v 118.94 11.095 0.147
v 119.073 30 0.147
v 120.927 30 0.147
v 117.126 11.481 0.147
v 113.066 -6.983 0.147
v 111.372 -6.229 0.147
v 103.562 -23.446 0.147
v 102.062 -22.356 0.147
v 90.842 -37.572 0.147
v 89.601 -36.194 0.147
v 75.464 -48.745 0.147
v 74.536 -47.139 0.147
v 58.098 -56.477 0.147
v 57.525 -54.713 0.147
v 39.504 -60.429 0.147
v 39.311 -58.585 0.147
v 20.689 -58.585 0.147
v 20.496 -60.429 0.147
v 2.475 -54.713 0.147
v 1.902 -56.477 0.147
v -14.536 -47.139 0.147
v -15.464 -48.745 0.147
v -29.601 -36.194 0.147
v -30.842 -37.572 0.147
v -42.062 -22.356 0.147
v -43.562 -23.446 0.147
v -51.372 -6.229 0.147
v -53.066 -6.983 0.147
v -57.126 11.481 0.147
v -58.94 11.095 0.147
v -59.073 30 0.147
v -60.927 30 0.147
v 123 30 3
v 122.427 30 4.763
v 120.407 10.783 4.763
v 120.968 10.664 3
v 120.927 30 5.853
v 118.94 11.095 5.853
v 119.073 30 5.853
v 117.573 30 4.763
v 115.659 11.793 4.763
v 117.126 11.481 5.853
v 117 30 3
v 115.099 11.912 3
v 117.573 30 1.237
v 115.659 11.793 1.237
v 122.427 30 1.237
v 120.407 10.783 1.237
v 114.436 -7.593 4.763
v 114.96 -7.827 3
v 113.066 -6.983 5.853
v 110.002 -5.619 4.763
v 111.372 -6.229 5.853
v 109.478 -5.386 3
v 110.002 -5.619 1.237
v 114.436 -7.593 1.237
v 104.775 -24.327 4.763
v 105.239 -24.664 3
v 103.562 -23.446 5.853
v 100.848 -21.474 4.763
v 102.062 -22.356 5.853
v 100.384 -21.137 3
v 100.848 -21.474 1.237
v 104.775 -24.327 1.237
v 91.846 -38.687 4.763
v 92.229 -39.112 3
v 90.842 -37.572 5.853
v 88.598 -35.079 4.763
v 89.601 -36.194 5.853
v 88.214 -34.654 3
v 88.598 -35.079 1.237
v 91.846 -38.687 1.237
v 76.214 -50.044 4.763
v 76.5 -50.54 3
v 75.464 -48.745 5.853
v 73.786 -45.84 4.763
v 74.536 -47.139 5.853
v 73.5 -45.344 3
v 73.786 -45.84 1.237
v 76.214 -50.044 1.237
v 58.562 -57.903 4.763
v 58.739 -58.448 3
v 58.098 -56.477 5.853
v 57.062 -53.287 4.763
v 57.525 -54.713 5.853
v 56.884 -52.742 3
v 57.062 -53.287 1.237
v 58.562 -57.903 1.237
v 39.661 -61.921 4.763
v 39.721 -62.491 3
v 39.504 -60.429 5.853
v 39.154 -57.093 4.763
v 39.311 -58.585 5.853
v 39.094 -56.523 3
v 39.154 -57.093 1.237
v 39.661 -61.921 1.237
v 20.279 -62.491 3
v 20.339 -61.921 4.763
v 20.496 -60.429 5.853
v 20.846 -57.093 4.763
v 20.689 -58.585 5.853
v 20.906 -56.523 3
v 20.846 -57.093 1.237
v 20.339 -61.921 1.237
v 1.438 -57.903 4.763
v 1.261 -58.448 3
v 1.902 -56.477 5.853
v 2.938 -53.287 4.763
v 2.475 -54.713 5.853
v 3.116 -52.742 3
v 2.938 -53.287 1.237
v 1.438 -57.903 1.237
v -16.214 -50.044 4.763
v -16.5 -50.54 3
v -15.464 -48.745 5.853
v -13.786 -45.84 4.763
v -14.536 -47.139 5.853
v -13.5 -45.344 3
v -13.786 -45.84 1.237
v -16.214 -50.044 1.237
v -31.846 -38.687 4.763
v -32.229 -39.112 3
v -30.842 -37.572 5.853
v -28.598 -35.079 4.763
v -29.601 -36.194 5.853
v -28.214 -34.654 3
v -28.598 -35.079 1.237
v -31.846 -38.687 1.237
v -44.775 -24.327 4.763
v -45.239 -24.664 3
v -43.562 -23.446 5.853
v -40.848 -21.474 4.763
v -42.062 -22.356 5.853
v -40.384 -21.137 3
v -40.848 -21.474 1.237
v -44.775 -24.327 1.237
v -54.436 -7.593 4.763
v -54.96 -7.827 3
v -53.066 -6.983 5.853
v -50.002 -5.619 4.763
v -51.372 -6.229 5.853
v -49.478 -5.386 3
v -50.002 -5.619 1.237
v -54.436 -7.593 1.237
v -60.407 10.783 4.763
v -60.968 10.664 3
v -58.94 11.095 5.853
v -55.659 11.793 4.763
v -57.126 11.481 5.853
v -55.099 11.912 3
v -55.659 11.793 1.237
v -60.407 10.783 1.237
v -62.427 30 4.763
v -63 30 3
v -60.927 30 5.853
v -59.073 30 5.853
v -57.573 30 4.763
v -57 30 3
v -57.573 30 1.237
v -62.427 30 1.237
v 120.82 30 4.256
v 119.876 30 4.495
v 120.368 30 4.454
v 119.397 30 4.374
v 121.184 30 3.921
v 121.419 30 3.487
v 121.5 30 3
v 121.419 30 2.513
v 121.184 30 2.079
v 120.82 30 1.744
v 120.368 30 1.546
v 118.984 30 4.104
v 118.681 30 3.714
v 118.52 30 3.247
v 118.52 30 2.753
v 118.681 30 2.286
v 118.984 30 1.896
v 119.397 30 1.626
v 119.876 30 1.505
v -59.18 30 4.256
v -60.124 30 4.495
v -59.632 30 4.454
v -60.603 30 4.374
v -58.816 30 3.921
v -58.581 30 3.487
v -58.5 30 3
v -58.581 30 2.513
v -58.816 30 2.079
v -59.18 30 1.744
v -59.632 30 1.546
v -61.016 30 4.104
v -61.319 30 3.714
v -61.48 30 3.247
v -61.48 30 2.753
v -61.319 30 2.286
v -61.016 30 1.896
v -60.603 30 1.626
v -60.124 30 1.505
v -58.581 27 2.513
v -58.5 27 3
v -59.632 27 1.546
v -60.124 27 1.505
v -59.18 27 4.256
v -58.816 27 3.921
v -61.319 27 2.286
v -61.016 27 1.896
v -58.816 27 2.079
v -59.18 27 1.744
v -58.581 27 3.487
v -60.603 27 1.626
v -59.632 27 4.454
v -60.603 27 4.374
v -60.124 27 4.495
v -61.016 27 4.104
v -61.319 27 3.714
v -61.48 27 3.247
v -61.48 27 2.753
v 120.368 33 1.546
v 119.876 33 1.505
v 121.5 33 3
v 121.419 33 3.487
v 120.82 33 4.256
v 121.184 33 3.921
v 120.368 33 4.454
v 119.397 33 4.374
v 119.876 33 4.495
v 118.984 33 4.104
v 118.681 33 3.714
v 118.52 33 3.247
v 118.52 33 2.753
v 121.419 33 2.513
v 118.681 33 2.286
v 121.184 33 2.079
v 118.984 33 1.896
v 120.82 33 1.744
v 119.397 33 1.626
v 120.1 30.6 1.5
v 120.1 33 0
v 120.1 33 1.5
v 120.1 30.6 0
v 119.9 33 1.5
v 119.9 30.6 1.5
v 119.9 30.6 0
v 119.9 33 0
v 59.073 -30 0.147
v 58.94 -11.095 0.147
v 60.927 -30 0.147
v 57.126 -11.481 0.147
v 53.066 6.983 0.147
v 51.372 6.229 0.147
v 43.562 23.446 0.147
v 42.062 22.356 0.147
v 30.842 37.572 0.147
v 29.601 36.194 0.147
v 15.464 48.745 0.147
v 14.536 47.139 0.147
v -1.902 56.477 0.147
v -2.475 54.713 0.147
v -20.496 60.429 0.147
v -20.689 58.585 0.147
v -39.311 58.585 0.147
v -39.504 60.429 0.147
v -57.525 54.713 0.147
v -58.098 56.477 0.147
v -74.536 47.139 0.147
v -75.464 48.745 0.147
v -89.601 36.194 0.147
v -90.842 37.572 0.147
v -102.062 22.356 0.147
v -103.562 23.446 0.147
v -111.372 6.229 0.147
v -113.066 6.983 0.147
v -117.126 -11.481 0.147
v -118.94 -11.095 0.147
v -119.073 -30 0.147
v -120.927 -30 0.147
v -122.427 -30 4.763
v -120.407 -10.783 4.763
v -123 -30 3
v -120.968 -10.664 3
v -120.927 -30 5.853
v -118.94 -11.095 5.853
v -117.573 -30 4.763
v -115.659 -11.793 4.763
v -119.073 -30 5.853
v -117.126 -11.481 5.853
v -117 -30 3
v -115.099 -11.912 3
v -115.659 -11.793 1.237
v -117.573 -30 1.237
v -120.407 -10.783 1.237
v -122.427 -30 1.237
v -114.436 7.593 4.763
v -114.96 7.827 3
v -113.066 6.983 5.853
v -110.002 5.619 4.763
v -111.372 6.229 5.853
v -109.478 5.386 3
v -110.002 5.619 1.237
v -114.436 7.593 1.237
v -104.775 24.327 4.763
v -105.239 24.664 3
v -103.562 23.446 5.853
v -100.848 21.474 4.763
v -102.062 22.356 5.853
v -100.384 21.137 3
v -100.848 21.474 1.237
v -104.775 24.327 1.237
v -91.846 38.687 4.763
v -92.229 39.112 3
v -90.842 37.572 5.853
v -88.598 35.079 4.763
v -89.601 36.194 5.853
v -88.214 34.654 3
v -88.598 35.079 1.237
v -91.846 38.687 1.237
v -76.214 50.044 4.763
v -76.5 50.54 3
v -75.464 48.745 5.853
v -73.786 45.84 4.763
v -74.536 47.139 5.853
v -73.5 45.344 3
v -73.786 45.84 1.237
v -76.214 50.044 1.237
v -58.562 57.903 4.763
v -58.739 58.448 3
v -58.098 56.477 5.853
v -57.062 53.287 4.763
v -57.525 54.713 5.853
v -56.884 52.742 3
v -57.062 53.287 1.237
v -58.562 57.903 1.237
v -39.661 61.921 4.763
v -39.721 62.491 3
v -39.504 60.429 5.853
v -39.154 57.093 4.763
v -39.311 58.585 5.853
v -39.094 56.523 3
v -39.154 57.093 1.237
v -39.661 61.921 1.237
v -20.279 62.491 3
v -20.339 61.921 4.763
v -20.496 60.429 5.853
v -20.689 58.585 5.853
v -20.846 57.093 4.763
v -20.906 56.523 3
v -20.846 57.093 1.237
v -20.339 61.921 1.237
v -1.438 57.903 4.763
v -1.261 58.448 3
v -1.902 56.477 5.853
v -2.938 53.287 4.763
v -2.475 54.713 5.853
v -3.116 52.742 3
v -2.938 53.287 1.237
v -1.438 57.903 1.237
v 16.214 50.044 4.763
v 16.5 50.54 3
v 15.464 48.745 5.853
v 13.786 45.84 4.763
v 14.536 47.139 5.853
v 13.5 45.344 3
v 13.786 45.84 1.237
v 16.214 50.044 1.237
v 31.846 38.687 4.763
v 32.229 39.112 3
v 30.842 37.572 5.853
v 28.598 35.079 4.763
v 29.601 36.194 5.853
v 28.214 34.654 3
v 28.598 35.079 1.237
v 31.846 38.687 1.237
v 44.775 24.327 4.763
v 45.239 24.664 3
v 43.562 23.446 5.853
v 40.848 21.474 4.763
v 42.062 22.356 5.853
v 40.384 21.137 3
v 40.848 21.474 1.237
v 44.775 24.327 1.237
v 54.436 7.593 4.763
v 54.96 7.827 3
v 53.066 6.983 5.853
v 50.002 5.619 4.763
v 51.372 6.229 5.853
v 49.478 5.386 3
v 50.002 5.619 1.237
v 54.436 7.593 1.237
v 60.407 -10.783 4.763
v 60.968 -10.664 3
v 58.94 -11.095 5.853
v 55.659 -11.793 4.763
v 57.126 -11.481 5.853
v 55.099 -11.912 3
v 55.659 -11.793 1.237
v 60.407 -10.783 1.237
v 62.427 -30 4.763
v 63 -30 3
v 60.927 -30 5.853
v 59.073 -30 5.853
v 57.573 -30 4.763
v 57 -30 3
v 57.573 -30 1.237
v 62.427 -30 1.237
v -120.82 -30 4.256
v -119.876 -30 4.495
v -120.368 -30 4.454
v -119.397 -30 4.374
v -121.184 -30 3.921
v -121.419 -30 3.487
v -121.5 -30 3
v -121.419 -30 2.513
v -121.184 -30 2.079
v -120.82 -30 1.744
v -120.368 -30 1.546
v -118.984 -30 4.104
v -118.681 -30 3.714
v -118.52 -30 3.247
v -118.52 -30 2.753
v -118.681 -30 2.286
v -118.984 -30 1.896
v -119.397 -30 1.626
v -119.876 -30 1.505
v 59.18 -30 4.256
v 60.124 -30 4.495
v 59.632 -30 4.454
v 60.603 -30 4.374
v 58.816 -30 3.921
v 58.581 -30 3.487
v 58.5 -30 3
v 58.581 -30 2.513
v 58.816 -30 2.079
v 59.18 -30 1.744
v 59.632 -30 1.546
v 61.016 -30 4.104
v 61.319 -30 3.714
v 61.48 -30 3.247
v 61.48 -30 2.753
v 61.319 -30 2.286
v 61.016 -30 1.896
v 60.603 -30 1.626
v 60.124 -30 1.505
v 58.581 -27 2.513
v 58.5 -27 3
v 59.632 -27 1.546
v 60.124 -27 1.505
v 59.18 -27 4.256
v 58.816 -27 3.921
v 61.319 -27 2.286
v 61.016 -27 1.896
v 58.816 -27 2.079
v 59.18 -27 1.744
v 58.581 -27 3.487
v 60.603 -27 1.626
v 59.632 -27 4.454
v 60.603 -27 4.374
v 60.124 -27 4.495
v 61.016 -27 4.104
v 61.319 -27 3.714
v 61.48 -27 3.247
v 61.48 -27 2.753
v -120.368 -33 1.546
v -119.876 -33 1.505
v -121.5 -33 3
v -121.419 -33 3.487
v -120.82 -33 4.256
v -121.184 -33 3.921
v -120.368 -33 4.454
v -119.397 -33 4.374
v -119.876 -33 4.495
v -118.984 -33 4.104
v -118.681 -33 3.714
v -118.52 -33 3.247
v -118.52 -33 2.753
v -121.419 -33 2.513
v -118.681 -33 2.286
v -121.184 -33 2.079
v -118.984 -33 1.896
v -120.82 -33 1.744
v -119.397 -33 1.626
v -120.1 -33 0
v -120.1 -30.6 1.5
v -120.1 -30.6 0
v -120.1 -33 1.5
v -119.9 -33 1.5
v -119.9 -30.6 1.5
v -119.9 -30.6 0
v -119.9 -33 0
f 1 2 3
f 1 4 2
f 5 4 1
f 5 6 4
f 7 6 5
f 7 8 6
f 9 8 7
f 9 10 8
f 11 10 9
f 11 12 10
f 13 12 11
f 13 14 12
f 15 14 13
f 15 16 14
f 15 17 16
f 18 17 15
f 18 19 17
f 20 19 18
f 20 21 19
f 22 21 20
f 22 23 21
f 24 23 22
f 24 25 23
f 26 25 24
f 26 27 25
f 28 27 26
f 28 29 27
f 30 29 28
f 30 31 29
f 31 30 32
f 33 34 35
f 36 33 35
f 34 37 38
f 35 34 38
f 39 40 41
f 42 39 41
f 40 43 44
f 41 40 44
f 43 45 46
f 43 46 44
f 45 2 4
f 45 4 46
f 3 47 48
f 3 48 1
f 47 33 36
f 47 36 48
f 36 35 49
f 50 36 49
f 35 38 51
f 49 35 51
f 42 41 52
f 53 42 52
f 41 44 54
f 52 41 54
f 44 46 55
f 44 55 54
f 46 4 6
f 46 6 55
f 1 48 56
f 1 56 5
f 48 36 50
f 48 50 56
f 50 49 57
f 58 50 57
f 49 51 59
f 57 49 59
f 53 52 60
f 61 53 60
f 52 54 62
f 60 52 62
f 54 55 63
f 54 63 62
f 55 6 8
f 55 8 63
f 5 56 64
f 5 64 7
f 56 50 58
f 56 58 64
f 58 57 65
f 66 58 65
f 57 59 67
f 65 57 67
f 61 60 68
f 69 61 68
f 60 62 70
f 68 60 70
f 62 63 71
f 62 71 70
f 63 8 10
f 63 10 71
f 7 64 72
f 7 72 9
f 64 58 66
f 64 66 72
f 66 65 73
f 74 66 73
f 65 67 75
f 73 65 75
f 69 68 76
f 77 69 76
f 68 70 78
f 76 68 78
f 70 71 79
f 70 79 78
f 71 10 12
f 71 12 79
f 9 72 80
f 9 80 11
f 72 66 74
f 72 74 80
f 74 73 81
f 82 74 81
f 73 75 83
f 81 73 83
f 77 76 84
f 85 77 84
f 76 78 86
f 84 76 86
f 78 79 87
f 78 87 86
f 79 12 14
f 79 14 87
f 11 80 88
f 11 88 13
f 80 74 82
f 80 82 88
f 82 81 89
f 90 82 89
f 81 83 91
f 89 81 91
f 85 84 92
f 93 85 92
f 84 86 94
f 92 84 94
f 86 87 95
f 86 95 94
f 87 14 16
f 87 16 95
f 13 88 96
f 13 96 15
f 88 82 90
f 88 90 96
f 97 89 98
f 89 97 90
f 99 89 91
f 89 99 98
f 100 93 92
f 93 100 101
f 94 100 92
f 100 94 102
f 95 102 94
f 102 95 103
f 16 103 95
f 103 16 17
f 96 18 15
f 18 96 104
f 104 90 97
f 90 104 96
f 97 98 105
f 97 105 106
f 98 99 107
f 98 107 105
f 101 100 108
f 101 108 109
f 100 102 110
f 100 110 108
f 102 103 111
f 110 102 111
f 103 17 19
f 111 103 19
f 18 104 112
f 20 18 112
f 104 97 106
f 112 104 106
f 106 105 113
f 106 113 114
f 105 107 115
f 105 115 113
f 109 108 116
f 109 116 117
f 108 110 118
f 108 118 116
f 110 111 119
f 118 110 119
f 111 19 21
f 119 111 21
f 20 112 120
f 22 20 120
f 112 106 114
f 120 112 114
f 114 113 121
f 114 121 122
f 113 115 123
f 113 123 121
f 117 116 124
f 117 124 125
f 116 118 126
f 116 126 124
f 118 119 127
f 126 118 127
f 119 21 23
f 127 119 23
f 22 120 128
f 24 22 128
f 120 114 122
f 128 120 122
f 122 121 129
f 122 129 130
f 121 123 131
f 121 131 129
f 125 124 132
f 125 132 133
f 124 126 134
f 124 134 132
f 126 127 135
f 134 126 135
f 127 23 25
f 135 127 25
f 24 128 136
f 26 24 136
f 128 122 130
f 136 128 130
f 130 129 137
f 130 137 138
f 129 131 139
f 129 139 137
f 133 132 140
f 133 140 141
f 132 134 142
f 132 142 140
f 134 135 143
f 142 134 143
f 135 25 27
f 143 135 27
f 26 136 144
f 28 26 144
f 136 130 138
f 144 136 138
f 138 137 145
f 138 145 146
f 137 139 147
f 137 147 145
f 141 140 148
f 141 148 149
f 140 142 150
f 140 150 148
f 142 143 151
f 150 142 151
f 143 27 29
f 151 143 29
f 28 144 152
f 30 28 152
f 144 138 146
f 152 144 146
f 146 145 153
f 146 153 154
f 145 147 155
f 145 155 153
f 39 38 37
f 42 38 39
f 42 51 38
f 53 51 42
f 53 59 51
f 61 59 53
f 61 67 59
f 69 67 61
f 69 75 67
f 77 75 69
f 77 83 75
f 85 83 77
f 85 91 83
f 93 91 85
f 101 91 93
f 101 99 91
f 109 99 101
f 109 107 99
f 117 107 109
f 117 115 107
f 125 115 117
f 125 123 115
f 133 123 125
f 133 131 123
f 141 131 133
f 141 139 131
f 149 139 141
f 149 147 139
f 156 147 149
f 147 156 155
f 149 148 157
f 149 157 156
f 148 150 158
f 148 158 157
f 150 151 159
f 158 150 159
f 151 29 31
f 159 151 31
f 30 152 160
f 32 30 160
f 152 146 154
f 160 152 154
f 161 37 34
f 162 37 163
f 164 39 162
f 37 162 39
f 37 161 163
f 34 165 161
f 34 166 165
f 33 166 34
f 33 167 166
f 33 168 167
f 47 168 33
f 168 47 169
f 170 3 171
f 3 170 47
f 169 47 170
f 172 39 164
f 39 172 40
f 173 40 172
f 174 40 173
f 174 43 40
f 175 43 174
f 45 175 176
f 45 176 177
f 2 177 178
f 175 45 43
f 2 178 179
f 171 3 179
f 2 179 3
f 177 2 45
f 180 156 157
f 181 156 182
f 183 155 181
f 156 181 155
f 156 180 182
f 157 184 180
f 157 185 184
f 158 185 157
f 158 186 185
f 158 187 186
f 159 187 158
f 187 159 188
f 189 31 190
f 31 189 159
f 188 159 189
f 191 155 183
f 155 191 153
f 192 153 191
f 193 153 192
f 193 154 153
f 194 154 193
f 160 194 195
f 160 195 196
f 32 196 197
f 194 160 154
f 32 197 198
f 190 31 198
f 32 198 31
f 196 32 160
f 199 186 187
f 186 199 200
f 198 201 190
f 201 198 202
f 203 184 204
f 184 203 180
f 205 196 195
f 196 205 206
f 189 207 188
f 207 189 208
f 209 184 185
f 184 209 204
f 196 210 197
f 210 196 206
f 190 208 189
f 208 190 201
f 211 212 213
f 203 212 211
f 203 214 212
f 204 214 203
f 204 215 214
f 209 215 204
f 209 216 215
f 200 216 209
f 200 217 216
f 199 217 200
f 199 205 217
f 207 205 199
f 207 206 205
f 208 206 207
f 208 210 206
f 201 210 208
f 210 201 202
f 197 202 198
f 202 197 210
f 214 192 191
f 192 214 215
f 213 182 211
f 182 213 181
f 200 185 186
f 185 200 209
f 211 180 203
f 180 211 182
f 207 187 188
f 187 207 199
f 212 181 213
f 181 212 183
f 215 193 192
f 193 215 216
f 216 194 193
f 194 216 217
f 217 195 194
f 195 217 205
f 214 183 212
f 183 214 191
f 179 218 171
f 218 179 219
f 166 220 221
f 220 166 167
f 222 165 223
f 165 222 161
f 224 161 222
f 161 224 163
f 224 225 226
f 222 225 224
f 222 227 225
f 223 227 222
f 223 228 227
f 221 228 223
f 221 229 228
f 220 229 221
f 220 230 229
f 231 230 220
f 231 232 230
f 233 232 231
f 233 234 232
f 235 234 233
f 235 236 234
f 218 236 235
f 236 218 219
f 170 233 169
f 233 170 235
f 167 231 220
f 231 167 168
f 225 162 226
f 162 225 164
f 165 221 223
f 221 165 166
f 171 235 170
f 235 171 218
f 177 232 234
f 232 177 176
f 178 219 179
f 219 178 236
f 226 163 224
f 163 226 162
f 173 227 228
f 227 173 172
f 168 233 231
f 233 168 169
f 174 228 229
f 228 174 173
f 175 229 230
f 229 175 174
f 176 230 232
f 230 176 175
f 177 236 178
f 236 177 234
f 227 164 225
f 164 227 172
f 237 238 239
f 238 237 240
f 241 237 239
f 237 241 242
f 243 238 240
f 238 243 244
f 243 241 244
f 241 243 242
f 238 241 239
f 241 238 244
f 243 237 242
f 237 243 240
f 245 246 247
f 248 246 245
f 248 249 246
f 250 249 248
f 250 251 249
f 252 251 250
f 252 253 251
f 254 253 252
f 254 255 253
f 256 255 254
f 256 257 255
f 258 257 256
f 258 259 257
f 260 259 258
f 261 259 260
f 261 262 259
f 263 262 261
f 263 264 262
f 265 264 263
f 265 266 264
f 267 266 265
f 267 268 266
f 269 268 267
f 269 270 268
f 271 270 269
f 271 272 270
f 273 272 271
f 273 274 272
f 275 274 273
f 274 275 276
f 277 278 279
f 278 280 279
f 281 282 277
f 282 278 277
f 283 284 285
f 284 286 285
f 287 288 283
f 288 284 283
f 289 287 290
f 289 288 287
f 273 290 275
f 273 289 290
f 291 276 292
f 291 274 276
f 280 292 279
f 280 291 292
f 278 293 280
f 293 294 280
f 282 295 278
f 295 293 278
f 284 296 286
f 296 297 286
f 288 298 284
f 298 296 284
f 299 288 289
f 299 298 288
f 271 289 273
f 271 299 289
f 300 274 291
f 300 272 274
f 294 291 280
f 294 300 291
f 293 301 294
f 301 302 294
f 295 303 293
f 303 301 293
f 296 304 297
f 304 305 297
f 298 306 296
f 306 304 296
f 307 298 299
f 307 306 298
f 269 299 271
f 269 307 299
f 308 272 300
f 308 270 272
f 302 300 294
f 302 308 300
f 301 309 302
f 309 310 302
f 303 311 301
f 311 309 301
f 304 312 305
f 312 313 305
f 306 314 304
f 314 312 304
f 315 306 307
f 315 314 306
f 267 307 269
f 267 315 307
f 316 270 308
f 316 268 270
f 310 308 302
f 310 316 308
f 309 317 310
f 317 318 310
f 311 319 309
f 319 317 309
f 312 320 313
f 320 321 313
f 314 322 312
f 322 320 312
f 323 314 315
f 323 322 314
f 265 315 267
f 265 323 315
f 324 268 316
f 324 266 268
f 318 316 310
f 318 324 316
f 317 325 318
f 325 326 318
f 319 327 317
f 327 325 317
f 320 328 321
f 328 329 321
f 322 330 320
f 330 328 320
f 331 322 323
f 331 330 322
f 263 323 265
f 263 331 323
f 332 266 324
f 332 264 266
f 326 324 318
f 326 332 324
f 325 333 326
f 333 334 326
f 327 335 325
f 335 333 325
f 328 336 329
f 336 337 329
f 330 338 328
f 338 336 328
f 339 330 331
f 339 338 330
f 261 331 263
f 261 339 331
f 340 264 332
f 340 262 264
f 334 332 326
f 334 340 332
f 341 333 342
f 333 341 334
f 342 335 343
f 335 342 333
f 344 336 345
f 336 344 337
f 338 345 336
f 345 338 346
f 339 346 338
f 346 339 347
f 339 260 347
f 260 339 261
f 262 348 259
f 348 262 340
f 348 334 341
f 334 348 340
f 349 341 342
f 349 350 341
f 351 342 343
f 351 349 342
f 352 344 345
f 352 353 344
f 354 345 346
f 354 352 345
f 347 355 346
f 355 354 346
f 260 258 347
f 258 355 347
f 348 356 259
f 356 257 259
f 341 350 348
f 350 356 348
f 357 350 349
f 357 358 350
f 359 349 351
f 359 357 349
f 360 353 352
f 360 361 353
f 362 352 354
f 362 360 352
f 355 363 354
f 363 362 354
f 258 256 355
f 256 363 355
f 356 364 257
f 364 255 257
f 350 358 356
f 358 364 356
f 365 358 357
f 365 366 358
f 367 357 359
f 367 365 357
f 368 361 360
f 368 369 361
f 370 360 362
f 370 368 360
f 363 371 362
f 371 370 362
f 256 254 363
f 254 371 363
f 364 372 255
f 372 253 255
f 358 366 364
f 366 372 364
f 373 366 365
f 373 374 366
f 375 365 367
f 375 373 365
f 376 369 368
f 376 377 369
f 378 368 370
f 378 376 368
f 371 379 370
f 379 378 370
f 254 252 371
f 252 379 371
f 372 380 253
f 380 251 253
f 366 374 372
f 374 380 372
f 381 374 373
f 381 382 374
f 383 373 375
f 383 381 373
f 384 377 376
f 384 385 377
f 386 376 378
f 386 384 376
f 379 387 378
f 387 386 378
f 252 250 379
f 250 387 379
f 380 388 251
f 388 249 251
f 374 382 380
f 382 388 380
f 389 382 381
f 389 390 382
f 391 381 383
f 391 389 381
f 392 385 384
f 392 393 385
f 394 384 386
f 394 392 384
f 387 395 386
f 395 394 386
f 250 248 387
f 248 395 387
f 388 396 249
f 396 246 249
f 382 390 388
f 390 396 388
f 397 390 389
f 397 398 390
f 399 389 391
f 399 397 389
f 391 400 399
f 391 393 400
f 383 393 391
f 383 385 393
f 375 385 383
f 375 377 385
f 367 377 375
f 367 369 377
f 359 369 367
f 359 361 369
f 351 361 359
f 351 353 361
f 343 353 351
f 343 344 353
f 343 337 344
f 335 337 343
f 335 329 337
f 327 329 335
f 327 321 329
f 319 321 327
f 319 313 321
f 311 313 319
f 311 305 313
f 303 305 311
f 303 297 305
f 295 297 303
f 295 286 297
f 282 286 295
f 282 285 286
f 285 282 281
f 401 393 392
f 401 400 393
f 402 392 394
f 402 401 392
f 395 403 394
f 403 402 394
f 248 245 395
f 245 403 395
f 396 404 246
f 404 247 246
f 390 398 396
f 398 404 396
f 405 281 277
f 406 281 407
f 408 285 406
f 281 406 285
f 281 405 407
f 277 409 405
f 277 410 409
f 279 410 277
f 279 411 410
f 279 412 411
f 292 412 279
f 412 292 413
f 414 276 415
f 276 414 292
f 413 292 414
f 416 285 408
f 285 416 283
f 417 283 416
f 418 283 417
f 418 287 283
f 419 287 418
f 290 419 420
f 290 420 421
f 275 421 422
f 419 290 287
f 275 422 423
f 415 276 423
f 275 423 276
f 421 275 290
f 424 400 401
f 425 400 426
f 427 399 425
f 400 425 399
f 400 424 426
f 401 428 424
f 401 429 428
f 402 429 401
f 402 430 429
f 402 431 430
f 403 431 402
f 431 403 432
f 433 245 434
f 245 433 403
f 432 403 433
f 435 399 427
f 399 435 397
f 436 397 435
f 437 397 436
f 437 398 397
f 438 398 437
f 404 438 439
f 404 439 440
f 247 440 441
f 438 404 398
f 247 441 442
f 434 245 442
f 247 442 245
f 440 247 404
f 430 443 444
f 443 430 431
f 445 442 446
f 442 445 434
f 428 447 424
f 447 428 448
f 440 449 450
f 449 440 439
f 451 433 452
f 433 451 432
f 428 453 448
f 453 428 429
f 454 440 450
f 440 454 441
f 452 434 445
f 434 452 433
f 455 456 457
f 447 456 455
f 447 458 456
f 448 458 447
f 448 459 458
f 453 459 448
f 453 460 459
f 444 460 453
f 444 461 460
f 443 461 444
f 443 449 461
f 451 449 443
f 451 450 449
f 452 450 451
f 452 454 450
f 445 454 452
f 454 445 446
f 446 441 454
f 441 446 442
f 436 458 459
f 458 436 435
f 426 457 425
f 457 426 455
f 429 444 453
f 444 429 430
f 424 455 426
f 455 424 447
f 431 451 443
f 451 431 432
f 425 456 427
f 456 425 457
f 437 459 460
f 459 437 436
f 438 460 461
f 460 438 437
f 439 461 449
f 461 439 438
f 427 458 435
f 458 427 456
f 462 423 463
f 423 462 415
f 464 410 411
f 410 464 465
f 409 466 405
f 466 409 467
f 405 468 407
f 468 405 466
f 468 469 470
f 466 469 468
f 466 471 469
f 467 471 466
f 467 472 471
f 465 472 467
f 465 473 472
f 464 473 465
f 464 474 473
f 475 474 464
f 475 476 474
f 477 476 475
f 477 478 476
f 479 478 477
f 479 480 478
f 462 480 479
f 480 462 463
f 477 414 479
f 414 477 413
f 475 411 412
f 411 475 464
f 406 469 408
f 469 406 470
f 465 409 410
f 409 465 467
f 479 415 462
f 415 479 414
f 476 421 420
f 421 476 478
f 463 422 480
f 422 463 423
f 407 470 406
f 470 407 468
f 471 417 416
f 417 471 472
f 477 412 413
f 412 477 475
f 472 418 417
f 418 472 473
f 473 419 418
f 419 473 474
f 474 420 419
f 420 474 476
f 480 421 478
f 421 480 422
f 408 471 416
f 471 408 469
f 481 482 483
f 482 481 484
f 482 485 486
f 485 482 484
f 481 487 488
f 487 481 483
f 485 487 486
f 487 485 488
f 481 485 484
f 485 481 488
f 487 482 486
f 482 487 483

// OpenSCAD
// [FL_INDEX: keywords="openscad, 3d_parametric, Customizable_Split_Circle___Torus, csg_solid" | COT="Parametric OpenSCAD design from 3DCodeverse"]
// Title: Customizable Split Circle / Torus

//Anthony Weber
//agweber@indiana.edu
//March 15, 2013

//build platform replicator2
//--284mm long
//--154mm wide
//--152mm tall

//From origin to center of ring
radius = 90; //

//Thickness is the diameter of the circle
thickness = 6; //

//Build support for nib? 1 == true
addSupport = 1; //[0:1]


//Fine tuning Y, bring circles closer
closeY = 0; //[0:20]

//Fine tuning X, bring circles closer
closeX = 0; //[0:20]

//Fine tuning, nib support thickness
supportThickness = 0.2;

//Show platform, 1 == true
showPlatform = 0; //[0:1]

//Platform X
platformX = 284;
//Platform Y
platformY = 154;

translate([radius/3 - closeX,radius/3 + closeY,0])
	wheelquarter(radius,thickness,addSupport);
rotate([0,0,180]) translate([radius/3 - closeX,radius/3 + closeY,0])
	wheelquarter(radius,thickness,addSupport);


module wheelquarter(wheelRadius=120, wheelThickness=6, support=1) {
	added=wheelRadius+wheelThickness/2;
	barSpacing = 10; //centimeter between the wheel bars
	difference() {
		union() {
			translate([0,0,wheelThickness/2])
				rotate_extrude() { //donut shape
				  translate([wheelRadius,0,0]) circle(r=wheelThickness/2);
				}
		}
		//Two cubes for halving the donut (could be one, I know)
		color("red") cube([added,added,wheelThickness]);
		translate([-added,0,0])color("red") cube([added,added,wheelThickness]);

		translate([-wheelRadius,0.5,wheelThickness/2]) //anti-nib
			rotate([90,0,0]) scale([0.25,0.25,1])
				cylinder(r=wheelThickness,h=wheelThickness/2+0.5);
	}
	translate([wheelRadius,wheelThickness/2,wheelThickness/2]) //nib
		rotate([90,0,0]) scale([0.25,0.25,1])
			cylinder(r=wheelThickness,h=wheelThickness/2);
	//Nib support.. thin cube underneath it could easily be cut off
	if (support != 0) {
		translate([wheelRadius-supportThickness/2,wheelThickness/2*0.2,0])
			color("white") cube([supportThickness,wheelThickness/2*0.8,wheelThickness/4]);
	}
}

//build platform
if (showPlatform != 0) {
	translate([-platformX/2,-platformY/2,-1])
		color("gray") cube([platformX,platformY,0.9]);
}
